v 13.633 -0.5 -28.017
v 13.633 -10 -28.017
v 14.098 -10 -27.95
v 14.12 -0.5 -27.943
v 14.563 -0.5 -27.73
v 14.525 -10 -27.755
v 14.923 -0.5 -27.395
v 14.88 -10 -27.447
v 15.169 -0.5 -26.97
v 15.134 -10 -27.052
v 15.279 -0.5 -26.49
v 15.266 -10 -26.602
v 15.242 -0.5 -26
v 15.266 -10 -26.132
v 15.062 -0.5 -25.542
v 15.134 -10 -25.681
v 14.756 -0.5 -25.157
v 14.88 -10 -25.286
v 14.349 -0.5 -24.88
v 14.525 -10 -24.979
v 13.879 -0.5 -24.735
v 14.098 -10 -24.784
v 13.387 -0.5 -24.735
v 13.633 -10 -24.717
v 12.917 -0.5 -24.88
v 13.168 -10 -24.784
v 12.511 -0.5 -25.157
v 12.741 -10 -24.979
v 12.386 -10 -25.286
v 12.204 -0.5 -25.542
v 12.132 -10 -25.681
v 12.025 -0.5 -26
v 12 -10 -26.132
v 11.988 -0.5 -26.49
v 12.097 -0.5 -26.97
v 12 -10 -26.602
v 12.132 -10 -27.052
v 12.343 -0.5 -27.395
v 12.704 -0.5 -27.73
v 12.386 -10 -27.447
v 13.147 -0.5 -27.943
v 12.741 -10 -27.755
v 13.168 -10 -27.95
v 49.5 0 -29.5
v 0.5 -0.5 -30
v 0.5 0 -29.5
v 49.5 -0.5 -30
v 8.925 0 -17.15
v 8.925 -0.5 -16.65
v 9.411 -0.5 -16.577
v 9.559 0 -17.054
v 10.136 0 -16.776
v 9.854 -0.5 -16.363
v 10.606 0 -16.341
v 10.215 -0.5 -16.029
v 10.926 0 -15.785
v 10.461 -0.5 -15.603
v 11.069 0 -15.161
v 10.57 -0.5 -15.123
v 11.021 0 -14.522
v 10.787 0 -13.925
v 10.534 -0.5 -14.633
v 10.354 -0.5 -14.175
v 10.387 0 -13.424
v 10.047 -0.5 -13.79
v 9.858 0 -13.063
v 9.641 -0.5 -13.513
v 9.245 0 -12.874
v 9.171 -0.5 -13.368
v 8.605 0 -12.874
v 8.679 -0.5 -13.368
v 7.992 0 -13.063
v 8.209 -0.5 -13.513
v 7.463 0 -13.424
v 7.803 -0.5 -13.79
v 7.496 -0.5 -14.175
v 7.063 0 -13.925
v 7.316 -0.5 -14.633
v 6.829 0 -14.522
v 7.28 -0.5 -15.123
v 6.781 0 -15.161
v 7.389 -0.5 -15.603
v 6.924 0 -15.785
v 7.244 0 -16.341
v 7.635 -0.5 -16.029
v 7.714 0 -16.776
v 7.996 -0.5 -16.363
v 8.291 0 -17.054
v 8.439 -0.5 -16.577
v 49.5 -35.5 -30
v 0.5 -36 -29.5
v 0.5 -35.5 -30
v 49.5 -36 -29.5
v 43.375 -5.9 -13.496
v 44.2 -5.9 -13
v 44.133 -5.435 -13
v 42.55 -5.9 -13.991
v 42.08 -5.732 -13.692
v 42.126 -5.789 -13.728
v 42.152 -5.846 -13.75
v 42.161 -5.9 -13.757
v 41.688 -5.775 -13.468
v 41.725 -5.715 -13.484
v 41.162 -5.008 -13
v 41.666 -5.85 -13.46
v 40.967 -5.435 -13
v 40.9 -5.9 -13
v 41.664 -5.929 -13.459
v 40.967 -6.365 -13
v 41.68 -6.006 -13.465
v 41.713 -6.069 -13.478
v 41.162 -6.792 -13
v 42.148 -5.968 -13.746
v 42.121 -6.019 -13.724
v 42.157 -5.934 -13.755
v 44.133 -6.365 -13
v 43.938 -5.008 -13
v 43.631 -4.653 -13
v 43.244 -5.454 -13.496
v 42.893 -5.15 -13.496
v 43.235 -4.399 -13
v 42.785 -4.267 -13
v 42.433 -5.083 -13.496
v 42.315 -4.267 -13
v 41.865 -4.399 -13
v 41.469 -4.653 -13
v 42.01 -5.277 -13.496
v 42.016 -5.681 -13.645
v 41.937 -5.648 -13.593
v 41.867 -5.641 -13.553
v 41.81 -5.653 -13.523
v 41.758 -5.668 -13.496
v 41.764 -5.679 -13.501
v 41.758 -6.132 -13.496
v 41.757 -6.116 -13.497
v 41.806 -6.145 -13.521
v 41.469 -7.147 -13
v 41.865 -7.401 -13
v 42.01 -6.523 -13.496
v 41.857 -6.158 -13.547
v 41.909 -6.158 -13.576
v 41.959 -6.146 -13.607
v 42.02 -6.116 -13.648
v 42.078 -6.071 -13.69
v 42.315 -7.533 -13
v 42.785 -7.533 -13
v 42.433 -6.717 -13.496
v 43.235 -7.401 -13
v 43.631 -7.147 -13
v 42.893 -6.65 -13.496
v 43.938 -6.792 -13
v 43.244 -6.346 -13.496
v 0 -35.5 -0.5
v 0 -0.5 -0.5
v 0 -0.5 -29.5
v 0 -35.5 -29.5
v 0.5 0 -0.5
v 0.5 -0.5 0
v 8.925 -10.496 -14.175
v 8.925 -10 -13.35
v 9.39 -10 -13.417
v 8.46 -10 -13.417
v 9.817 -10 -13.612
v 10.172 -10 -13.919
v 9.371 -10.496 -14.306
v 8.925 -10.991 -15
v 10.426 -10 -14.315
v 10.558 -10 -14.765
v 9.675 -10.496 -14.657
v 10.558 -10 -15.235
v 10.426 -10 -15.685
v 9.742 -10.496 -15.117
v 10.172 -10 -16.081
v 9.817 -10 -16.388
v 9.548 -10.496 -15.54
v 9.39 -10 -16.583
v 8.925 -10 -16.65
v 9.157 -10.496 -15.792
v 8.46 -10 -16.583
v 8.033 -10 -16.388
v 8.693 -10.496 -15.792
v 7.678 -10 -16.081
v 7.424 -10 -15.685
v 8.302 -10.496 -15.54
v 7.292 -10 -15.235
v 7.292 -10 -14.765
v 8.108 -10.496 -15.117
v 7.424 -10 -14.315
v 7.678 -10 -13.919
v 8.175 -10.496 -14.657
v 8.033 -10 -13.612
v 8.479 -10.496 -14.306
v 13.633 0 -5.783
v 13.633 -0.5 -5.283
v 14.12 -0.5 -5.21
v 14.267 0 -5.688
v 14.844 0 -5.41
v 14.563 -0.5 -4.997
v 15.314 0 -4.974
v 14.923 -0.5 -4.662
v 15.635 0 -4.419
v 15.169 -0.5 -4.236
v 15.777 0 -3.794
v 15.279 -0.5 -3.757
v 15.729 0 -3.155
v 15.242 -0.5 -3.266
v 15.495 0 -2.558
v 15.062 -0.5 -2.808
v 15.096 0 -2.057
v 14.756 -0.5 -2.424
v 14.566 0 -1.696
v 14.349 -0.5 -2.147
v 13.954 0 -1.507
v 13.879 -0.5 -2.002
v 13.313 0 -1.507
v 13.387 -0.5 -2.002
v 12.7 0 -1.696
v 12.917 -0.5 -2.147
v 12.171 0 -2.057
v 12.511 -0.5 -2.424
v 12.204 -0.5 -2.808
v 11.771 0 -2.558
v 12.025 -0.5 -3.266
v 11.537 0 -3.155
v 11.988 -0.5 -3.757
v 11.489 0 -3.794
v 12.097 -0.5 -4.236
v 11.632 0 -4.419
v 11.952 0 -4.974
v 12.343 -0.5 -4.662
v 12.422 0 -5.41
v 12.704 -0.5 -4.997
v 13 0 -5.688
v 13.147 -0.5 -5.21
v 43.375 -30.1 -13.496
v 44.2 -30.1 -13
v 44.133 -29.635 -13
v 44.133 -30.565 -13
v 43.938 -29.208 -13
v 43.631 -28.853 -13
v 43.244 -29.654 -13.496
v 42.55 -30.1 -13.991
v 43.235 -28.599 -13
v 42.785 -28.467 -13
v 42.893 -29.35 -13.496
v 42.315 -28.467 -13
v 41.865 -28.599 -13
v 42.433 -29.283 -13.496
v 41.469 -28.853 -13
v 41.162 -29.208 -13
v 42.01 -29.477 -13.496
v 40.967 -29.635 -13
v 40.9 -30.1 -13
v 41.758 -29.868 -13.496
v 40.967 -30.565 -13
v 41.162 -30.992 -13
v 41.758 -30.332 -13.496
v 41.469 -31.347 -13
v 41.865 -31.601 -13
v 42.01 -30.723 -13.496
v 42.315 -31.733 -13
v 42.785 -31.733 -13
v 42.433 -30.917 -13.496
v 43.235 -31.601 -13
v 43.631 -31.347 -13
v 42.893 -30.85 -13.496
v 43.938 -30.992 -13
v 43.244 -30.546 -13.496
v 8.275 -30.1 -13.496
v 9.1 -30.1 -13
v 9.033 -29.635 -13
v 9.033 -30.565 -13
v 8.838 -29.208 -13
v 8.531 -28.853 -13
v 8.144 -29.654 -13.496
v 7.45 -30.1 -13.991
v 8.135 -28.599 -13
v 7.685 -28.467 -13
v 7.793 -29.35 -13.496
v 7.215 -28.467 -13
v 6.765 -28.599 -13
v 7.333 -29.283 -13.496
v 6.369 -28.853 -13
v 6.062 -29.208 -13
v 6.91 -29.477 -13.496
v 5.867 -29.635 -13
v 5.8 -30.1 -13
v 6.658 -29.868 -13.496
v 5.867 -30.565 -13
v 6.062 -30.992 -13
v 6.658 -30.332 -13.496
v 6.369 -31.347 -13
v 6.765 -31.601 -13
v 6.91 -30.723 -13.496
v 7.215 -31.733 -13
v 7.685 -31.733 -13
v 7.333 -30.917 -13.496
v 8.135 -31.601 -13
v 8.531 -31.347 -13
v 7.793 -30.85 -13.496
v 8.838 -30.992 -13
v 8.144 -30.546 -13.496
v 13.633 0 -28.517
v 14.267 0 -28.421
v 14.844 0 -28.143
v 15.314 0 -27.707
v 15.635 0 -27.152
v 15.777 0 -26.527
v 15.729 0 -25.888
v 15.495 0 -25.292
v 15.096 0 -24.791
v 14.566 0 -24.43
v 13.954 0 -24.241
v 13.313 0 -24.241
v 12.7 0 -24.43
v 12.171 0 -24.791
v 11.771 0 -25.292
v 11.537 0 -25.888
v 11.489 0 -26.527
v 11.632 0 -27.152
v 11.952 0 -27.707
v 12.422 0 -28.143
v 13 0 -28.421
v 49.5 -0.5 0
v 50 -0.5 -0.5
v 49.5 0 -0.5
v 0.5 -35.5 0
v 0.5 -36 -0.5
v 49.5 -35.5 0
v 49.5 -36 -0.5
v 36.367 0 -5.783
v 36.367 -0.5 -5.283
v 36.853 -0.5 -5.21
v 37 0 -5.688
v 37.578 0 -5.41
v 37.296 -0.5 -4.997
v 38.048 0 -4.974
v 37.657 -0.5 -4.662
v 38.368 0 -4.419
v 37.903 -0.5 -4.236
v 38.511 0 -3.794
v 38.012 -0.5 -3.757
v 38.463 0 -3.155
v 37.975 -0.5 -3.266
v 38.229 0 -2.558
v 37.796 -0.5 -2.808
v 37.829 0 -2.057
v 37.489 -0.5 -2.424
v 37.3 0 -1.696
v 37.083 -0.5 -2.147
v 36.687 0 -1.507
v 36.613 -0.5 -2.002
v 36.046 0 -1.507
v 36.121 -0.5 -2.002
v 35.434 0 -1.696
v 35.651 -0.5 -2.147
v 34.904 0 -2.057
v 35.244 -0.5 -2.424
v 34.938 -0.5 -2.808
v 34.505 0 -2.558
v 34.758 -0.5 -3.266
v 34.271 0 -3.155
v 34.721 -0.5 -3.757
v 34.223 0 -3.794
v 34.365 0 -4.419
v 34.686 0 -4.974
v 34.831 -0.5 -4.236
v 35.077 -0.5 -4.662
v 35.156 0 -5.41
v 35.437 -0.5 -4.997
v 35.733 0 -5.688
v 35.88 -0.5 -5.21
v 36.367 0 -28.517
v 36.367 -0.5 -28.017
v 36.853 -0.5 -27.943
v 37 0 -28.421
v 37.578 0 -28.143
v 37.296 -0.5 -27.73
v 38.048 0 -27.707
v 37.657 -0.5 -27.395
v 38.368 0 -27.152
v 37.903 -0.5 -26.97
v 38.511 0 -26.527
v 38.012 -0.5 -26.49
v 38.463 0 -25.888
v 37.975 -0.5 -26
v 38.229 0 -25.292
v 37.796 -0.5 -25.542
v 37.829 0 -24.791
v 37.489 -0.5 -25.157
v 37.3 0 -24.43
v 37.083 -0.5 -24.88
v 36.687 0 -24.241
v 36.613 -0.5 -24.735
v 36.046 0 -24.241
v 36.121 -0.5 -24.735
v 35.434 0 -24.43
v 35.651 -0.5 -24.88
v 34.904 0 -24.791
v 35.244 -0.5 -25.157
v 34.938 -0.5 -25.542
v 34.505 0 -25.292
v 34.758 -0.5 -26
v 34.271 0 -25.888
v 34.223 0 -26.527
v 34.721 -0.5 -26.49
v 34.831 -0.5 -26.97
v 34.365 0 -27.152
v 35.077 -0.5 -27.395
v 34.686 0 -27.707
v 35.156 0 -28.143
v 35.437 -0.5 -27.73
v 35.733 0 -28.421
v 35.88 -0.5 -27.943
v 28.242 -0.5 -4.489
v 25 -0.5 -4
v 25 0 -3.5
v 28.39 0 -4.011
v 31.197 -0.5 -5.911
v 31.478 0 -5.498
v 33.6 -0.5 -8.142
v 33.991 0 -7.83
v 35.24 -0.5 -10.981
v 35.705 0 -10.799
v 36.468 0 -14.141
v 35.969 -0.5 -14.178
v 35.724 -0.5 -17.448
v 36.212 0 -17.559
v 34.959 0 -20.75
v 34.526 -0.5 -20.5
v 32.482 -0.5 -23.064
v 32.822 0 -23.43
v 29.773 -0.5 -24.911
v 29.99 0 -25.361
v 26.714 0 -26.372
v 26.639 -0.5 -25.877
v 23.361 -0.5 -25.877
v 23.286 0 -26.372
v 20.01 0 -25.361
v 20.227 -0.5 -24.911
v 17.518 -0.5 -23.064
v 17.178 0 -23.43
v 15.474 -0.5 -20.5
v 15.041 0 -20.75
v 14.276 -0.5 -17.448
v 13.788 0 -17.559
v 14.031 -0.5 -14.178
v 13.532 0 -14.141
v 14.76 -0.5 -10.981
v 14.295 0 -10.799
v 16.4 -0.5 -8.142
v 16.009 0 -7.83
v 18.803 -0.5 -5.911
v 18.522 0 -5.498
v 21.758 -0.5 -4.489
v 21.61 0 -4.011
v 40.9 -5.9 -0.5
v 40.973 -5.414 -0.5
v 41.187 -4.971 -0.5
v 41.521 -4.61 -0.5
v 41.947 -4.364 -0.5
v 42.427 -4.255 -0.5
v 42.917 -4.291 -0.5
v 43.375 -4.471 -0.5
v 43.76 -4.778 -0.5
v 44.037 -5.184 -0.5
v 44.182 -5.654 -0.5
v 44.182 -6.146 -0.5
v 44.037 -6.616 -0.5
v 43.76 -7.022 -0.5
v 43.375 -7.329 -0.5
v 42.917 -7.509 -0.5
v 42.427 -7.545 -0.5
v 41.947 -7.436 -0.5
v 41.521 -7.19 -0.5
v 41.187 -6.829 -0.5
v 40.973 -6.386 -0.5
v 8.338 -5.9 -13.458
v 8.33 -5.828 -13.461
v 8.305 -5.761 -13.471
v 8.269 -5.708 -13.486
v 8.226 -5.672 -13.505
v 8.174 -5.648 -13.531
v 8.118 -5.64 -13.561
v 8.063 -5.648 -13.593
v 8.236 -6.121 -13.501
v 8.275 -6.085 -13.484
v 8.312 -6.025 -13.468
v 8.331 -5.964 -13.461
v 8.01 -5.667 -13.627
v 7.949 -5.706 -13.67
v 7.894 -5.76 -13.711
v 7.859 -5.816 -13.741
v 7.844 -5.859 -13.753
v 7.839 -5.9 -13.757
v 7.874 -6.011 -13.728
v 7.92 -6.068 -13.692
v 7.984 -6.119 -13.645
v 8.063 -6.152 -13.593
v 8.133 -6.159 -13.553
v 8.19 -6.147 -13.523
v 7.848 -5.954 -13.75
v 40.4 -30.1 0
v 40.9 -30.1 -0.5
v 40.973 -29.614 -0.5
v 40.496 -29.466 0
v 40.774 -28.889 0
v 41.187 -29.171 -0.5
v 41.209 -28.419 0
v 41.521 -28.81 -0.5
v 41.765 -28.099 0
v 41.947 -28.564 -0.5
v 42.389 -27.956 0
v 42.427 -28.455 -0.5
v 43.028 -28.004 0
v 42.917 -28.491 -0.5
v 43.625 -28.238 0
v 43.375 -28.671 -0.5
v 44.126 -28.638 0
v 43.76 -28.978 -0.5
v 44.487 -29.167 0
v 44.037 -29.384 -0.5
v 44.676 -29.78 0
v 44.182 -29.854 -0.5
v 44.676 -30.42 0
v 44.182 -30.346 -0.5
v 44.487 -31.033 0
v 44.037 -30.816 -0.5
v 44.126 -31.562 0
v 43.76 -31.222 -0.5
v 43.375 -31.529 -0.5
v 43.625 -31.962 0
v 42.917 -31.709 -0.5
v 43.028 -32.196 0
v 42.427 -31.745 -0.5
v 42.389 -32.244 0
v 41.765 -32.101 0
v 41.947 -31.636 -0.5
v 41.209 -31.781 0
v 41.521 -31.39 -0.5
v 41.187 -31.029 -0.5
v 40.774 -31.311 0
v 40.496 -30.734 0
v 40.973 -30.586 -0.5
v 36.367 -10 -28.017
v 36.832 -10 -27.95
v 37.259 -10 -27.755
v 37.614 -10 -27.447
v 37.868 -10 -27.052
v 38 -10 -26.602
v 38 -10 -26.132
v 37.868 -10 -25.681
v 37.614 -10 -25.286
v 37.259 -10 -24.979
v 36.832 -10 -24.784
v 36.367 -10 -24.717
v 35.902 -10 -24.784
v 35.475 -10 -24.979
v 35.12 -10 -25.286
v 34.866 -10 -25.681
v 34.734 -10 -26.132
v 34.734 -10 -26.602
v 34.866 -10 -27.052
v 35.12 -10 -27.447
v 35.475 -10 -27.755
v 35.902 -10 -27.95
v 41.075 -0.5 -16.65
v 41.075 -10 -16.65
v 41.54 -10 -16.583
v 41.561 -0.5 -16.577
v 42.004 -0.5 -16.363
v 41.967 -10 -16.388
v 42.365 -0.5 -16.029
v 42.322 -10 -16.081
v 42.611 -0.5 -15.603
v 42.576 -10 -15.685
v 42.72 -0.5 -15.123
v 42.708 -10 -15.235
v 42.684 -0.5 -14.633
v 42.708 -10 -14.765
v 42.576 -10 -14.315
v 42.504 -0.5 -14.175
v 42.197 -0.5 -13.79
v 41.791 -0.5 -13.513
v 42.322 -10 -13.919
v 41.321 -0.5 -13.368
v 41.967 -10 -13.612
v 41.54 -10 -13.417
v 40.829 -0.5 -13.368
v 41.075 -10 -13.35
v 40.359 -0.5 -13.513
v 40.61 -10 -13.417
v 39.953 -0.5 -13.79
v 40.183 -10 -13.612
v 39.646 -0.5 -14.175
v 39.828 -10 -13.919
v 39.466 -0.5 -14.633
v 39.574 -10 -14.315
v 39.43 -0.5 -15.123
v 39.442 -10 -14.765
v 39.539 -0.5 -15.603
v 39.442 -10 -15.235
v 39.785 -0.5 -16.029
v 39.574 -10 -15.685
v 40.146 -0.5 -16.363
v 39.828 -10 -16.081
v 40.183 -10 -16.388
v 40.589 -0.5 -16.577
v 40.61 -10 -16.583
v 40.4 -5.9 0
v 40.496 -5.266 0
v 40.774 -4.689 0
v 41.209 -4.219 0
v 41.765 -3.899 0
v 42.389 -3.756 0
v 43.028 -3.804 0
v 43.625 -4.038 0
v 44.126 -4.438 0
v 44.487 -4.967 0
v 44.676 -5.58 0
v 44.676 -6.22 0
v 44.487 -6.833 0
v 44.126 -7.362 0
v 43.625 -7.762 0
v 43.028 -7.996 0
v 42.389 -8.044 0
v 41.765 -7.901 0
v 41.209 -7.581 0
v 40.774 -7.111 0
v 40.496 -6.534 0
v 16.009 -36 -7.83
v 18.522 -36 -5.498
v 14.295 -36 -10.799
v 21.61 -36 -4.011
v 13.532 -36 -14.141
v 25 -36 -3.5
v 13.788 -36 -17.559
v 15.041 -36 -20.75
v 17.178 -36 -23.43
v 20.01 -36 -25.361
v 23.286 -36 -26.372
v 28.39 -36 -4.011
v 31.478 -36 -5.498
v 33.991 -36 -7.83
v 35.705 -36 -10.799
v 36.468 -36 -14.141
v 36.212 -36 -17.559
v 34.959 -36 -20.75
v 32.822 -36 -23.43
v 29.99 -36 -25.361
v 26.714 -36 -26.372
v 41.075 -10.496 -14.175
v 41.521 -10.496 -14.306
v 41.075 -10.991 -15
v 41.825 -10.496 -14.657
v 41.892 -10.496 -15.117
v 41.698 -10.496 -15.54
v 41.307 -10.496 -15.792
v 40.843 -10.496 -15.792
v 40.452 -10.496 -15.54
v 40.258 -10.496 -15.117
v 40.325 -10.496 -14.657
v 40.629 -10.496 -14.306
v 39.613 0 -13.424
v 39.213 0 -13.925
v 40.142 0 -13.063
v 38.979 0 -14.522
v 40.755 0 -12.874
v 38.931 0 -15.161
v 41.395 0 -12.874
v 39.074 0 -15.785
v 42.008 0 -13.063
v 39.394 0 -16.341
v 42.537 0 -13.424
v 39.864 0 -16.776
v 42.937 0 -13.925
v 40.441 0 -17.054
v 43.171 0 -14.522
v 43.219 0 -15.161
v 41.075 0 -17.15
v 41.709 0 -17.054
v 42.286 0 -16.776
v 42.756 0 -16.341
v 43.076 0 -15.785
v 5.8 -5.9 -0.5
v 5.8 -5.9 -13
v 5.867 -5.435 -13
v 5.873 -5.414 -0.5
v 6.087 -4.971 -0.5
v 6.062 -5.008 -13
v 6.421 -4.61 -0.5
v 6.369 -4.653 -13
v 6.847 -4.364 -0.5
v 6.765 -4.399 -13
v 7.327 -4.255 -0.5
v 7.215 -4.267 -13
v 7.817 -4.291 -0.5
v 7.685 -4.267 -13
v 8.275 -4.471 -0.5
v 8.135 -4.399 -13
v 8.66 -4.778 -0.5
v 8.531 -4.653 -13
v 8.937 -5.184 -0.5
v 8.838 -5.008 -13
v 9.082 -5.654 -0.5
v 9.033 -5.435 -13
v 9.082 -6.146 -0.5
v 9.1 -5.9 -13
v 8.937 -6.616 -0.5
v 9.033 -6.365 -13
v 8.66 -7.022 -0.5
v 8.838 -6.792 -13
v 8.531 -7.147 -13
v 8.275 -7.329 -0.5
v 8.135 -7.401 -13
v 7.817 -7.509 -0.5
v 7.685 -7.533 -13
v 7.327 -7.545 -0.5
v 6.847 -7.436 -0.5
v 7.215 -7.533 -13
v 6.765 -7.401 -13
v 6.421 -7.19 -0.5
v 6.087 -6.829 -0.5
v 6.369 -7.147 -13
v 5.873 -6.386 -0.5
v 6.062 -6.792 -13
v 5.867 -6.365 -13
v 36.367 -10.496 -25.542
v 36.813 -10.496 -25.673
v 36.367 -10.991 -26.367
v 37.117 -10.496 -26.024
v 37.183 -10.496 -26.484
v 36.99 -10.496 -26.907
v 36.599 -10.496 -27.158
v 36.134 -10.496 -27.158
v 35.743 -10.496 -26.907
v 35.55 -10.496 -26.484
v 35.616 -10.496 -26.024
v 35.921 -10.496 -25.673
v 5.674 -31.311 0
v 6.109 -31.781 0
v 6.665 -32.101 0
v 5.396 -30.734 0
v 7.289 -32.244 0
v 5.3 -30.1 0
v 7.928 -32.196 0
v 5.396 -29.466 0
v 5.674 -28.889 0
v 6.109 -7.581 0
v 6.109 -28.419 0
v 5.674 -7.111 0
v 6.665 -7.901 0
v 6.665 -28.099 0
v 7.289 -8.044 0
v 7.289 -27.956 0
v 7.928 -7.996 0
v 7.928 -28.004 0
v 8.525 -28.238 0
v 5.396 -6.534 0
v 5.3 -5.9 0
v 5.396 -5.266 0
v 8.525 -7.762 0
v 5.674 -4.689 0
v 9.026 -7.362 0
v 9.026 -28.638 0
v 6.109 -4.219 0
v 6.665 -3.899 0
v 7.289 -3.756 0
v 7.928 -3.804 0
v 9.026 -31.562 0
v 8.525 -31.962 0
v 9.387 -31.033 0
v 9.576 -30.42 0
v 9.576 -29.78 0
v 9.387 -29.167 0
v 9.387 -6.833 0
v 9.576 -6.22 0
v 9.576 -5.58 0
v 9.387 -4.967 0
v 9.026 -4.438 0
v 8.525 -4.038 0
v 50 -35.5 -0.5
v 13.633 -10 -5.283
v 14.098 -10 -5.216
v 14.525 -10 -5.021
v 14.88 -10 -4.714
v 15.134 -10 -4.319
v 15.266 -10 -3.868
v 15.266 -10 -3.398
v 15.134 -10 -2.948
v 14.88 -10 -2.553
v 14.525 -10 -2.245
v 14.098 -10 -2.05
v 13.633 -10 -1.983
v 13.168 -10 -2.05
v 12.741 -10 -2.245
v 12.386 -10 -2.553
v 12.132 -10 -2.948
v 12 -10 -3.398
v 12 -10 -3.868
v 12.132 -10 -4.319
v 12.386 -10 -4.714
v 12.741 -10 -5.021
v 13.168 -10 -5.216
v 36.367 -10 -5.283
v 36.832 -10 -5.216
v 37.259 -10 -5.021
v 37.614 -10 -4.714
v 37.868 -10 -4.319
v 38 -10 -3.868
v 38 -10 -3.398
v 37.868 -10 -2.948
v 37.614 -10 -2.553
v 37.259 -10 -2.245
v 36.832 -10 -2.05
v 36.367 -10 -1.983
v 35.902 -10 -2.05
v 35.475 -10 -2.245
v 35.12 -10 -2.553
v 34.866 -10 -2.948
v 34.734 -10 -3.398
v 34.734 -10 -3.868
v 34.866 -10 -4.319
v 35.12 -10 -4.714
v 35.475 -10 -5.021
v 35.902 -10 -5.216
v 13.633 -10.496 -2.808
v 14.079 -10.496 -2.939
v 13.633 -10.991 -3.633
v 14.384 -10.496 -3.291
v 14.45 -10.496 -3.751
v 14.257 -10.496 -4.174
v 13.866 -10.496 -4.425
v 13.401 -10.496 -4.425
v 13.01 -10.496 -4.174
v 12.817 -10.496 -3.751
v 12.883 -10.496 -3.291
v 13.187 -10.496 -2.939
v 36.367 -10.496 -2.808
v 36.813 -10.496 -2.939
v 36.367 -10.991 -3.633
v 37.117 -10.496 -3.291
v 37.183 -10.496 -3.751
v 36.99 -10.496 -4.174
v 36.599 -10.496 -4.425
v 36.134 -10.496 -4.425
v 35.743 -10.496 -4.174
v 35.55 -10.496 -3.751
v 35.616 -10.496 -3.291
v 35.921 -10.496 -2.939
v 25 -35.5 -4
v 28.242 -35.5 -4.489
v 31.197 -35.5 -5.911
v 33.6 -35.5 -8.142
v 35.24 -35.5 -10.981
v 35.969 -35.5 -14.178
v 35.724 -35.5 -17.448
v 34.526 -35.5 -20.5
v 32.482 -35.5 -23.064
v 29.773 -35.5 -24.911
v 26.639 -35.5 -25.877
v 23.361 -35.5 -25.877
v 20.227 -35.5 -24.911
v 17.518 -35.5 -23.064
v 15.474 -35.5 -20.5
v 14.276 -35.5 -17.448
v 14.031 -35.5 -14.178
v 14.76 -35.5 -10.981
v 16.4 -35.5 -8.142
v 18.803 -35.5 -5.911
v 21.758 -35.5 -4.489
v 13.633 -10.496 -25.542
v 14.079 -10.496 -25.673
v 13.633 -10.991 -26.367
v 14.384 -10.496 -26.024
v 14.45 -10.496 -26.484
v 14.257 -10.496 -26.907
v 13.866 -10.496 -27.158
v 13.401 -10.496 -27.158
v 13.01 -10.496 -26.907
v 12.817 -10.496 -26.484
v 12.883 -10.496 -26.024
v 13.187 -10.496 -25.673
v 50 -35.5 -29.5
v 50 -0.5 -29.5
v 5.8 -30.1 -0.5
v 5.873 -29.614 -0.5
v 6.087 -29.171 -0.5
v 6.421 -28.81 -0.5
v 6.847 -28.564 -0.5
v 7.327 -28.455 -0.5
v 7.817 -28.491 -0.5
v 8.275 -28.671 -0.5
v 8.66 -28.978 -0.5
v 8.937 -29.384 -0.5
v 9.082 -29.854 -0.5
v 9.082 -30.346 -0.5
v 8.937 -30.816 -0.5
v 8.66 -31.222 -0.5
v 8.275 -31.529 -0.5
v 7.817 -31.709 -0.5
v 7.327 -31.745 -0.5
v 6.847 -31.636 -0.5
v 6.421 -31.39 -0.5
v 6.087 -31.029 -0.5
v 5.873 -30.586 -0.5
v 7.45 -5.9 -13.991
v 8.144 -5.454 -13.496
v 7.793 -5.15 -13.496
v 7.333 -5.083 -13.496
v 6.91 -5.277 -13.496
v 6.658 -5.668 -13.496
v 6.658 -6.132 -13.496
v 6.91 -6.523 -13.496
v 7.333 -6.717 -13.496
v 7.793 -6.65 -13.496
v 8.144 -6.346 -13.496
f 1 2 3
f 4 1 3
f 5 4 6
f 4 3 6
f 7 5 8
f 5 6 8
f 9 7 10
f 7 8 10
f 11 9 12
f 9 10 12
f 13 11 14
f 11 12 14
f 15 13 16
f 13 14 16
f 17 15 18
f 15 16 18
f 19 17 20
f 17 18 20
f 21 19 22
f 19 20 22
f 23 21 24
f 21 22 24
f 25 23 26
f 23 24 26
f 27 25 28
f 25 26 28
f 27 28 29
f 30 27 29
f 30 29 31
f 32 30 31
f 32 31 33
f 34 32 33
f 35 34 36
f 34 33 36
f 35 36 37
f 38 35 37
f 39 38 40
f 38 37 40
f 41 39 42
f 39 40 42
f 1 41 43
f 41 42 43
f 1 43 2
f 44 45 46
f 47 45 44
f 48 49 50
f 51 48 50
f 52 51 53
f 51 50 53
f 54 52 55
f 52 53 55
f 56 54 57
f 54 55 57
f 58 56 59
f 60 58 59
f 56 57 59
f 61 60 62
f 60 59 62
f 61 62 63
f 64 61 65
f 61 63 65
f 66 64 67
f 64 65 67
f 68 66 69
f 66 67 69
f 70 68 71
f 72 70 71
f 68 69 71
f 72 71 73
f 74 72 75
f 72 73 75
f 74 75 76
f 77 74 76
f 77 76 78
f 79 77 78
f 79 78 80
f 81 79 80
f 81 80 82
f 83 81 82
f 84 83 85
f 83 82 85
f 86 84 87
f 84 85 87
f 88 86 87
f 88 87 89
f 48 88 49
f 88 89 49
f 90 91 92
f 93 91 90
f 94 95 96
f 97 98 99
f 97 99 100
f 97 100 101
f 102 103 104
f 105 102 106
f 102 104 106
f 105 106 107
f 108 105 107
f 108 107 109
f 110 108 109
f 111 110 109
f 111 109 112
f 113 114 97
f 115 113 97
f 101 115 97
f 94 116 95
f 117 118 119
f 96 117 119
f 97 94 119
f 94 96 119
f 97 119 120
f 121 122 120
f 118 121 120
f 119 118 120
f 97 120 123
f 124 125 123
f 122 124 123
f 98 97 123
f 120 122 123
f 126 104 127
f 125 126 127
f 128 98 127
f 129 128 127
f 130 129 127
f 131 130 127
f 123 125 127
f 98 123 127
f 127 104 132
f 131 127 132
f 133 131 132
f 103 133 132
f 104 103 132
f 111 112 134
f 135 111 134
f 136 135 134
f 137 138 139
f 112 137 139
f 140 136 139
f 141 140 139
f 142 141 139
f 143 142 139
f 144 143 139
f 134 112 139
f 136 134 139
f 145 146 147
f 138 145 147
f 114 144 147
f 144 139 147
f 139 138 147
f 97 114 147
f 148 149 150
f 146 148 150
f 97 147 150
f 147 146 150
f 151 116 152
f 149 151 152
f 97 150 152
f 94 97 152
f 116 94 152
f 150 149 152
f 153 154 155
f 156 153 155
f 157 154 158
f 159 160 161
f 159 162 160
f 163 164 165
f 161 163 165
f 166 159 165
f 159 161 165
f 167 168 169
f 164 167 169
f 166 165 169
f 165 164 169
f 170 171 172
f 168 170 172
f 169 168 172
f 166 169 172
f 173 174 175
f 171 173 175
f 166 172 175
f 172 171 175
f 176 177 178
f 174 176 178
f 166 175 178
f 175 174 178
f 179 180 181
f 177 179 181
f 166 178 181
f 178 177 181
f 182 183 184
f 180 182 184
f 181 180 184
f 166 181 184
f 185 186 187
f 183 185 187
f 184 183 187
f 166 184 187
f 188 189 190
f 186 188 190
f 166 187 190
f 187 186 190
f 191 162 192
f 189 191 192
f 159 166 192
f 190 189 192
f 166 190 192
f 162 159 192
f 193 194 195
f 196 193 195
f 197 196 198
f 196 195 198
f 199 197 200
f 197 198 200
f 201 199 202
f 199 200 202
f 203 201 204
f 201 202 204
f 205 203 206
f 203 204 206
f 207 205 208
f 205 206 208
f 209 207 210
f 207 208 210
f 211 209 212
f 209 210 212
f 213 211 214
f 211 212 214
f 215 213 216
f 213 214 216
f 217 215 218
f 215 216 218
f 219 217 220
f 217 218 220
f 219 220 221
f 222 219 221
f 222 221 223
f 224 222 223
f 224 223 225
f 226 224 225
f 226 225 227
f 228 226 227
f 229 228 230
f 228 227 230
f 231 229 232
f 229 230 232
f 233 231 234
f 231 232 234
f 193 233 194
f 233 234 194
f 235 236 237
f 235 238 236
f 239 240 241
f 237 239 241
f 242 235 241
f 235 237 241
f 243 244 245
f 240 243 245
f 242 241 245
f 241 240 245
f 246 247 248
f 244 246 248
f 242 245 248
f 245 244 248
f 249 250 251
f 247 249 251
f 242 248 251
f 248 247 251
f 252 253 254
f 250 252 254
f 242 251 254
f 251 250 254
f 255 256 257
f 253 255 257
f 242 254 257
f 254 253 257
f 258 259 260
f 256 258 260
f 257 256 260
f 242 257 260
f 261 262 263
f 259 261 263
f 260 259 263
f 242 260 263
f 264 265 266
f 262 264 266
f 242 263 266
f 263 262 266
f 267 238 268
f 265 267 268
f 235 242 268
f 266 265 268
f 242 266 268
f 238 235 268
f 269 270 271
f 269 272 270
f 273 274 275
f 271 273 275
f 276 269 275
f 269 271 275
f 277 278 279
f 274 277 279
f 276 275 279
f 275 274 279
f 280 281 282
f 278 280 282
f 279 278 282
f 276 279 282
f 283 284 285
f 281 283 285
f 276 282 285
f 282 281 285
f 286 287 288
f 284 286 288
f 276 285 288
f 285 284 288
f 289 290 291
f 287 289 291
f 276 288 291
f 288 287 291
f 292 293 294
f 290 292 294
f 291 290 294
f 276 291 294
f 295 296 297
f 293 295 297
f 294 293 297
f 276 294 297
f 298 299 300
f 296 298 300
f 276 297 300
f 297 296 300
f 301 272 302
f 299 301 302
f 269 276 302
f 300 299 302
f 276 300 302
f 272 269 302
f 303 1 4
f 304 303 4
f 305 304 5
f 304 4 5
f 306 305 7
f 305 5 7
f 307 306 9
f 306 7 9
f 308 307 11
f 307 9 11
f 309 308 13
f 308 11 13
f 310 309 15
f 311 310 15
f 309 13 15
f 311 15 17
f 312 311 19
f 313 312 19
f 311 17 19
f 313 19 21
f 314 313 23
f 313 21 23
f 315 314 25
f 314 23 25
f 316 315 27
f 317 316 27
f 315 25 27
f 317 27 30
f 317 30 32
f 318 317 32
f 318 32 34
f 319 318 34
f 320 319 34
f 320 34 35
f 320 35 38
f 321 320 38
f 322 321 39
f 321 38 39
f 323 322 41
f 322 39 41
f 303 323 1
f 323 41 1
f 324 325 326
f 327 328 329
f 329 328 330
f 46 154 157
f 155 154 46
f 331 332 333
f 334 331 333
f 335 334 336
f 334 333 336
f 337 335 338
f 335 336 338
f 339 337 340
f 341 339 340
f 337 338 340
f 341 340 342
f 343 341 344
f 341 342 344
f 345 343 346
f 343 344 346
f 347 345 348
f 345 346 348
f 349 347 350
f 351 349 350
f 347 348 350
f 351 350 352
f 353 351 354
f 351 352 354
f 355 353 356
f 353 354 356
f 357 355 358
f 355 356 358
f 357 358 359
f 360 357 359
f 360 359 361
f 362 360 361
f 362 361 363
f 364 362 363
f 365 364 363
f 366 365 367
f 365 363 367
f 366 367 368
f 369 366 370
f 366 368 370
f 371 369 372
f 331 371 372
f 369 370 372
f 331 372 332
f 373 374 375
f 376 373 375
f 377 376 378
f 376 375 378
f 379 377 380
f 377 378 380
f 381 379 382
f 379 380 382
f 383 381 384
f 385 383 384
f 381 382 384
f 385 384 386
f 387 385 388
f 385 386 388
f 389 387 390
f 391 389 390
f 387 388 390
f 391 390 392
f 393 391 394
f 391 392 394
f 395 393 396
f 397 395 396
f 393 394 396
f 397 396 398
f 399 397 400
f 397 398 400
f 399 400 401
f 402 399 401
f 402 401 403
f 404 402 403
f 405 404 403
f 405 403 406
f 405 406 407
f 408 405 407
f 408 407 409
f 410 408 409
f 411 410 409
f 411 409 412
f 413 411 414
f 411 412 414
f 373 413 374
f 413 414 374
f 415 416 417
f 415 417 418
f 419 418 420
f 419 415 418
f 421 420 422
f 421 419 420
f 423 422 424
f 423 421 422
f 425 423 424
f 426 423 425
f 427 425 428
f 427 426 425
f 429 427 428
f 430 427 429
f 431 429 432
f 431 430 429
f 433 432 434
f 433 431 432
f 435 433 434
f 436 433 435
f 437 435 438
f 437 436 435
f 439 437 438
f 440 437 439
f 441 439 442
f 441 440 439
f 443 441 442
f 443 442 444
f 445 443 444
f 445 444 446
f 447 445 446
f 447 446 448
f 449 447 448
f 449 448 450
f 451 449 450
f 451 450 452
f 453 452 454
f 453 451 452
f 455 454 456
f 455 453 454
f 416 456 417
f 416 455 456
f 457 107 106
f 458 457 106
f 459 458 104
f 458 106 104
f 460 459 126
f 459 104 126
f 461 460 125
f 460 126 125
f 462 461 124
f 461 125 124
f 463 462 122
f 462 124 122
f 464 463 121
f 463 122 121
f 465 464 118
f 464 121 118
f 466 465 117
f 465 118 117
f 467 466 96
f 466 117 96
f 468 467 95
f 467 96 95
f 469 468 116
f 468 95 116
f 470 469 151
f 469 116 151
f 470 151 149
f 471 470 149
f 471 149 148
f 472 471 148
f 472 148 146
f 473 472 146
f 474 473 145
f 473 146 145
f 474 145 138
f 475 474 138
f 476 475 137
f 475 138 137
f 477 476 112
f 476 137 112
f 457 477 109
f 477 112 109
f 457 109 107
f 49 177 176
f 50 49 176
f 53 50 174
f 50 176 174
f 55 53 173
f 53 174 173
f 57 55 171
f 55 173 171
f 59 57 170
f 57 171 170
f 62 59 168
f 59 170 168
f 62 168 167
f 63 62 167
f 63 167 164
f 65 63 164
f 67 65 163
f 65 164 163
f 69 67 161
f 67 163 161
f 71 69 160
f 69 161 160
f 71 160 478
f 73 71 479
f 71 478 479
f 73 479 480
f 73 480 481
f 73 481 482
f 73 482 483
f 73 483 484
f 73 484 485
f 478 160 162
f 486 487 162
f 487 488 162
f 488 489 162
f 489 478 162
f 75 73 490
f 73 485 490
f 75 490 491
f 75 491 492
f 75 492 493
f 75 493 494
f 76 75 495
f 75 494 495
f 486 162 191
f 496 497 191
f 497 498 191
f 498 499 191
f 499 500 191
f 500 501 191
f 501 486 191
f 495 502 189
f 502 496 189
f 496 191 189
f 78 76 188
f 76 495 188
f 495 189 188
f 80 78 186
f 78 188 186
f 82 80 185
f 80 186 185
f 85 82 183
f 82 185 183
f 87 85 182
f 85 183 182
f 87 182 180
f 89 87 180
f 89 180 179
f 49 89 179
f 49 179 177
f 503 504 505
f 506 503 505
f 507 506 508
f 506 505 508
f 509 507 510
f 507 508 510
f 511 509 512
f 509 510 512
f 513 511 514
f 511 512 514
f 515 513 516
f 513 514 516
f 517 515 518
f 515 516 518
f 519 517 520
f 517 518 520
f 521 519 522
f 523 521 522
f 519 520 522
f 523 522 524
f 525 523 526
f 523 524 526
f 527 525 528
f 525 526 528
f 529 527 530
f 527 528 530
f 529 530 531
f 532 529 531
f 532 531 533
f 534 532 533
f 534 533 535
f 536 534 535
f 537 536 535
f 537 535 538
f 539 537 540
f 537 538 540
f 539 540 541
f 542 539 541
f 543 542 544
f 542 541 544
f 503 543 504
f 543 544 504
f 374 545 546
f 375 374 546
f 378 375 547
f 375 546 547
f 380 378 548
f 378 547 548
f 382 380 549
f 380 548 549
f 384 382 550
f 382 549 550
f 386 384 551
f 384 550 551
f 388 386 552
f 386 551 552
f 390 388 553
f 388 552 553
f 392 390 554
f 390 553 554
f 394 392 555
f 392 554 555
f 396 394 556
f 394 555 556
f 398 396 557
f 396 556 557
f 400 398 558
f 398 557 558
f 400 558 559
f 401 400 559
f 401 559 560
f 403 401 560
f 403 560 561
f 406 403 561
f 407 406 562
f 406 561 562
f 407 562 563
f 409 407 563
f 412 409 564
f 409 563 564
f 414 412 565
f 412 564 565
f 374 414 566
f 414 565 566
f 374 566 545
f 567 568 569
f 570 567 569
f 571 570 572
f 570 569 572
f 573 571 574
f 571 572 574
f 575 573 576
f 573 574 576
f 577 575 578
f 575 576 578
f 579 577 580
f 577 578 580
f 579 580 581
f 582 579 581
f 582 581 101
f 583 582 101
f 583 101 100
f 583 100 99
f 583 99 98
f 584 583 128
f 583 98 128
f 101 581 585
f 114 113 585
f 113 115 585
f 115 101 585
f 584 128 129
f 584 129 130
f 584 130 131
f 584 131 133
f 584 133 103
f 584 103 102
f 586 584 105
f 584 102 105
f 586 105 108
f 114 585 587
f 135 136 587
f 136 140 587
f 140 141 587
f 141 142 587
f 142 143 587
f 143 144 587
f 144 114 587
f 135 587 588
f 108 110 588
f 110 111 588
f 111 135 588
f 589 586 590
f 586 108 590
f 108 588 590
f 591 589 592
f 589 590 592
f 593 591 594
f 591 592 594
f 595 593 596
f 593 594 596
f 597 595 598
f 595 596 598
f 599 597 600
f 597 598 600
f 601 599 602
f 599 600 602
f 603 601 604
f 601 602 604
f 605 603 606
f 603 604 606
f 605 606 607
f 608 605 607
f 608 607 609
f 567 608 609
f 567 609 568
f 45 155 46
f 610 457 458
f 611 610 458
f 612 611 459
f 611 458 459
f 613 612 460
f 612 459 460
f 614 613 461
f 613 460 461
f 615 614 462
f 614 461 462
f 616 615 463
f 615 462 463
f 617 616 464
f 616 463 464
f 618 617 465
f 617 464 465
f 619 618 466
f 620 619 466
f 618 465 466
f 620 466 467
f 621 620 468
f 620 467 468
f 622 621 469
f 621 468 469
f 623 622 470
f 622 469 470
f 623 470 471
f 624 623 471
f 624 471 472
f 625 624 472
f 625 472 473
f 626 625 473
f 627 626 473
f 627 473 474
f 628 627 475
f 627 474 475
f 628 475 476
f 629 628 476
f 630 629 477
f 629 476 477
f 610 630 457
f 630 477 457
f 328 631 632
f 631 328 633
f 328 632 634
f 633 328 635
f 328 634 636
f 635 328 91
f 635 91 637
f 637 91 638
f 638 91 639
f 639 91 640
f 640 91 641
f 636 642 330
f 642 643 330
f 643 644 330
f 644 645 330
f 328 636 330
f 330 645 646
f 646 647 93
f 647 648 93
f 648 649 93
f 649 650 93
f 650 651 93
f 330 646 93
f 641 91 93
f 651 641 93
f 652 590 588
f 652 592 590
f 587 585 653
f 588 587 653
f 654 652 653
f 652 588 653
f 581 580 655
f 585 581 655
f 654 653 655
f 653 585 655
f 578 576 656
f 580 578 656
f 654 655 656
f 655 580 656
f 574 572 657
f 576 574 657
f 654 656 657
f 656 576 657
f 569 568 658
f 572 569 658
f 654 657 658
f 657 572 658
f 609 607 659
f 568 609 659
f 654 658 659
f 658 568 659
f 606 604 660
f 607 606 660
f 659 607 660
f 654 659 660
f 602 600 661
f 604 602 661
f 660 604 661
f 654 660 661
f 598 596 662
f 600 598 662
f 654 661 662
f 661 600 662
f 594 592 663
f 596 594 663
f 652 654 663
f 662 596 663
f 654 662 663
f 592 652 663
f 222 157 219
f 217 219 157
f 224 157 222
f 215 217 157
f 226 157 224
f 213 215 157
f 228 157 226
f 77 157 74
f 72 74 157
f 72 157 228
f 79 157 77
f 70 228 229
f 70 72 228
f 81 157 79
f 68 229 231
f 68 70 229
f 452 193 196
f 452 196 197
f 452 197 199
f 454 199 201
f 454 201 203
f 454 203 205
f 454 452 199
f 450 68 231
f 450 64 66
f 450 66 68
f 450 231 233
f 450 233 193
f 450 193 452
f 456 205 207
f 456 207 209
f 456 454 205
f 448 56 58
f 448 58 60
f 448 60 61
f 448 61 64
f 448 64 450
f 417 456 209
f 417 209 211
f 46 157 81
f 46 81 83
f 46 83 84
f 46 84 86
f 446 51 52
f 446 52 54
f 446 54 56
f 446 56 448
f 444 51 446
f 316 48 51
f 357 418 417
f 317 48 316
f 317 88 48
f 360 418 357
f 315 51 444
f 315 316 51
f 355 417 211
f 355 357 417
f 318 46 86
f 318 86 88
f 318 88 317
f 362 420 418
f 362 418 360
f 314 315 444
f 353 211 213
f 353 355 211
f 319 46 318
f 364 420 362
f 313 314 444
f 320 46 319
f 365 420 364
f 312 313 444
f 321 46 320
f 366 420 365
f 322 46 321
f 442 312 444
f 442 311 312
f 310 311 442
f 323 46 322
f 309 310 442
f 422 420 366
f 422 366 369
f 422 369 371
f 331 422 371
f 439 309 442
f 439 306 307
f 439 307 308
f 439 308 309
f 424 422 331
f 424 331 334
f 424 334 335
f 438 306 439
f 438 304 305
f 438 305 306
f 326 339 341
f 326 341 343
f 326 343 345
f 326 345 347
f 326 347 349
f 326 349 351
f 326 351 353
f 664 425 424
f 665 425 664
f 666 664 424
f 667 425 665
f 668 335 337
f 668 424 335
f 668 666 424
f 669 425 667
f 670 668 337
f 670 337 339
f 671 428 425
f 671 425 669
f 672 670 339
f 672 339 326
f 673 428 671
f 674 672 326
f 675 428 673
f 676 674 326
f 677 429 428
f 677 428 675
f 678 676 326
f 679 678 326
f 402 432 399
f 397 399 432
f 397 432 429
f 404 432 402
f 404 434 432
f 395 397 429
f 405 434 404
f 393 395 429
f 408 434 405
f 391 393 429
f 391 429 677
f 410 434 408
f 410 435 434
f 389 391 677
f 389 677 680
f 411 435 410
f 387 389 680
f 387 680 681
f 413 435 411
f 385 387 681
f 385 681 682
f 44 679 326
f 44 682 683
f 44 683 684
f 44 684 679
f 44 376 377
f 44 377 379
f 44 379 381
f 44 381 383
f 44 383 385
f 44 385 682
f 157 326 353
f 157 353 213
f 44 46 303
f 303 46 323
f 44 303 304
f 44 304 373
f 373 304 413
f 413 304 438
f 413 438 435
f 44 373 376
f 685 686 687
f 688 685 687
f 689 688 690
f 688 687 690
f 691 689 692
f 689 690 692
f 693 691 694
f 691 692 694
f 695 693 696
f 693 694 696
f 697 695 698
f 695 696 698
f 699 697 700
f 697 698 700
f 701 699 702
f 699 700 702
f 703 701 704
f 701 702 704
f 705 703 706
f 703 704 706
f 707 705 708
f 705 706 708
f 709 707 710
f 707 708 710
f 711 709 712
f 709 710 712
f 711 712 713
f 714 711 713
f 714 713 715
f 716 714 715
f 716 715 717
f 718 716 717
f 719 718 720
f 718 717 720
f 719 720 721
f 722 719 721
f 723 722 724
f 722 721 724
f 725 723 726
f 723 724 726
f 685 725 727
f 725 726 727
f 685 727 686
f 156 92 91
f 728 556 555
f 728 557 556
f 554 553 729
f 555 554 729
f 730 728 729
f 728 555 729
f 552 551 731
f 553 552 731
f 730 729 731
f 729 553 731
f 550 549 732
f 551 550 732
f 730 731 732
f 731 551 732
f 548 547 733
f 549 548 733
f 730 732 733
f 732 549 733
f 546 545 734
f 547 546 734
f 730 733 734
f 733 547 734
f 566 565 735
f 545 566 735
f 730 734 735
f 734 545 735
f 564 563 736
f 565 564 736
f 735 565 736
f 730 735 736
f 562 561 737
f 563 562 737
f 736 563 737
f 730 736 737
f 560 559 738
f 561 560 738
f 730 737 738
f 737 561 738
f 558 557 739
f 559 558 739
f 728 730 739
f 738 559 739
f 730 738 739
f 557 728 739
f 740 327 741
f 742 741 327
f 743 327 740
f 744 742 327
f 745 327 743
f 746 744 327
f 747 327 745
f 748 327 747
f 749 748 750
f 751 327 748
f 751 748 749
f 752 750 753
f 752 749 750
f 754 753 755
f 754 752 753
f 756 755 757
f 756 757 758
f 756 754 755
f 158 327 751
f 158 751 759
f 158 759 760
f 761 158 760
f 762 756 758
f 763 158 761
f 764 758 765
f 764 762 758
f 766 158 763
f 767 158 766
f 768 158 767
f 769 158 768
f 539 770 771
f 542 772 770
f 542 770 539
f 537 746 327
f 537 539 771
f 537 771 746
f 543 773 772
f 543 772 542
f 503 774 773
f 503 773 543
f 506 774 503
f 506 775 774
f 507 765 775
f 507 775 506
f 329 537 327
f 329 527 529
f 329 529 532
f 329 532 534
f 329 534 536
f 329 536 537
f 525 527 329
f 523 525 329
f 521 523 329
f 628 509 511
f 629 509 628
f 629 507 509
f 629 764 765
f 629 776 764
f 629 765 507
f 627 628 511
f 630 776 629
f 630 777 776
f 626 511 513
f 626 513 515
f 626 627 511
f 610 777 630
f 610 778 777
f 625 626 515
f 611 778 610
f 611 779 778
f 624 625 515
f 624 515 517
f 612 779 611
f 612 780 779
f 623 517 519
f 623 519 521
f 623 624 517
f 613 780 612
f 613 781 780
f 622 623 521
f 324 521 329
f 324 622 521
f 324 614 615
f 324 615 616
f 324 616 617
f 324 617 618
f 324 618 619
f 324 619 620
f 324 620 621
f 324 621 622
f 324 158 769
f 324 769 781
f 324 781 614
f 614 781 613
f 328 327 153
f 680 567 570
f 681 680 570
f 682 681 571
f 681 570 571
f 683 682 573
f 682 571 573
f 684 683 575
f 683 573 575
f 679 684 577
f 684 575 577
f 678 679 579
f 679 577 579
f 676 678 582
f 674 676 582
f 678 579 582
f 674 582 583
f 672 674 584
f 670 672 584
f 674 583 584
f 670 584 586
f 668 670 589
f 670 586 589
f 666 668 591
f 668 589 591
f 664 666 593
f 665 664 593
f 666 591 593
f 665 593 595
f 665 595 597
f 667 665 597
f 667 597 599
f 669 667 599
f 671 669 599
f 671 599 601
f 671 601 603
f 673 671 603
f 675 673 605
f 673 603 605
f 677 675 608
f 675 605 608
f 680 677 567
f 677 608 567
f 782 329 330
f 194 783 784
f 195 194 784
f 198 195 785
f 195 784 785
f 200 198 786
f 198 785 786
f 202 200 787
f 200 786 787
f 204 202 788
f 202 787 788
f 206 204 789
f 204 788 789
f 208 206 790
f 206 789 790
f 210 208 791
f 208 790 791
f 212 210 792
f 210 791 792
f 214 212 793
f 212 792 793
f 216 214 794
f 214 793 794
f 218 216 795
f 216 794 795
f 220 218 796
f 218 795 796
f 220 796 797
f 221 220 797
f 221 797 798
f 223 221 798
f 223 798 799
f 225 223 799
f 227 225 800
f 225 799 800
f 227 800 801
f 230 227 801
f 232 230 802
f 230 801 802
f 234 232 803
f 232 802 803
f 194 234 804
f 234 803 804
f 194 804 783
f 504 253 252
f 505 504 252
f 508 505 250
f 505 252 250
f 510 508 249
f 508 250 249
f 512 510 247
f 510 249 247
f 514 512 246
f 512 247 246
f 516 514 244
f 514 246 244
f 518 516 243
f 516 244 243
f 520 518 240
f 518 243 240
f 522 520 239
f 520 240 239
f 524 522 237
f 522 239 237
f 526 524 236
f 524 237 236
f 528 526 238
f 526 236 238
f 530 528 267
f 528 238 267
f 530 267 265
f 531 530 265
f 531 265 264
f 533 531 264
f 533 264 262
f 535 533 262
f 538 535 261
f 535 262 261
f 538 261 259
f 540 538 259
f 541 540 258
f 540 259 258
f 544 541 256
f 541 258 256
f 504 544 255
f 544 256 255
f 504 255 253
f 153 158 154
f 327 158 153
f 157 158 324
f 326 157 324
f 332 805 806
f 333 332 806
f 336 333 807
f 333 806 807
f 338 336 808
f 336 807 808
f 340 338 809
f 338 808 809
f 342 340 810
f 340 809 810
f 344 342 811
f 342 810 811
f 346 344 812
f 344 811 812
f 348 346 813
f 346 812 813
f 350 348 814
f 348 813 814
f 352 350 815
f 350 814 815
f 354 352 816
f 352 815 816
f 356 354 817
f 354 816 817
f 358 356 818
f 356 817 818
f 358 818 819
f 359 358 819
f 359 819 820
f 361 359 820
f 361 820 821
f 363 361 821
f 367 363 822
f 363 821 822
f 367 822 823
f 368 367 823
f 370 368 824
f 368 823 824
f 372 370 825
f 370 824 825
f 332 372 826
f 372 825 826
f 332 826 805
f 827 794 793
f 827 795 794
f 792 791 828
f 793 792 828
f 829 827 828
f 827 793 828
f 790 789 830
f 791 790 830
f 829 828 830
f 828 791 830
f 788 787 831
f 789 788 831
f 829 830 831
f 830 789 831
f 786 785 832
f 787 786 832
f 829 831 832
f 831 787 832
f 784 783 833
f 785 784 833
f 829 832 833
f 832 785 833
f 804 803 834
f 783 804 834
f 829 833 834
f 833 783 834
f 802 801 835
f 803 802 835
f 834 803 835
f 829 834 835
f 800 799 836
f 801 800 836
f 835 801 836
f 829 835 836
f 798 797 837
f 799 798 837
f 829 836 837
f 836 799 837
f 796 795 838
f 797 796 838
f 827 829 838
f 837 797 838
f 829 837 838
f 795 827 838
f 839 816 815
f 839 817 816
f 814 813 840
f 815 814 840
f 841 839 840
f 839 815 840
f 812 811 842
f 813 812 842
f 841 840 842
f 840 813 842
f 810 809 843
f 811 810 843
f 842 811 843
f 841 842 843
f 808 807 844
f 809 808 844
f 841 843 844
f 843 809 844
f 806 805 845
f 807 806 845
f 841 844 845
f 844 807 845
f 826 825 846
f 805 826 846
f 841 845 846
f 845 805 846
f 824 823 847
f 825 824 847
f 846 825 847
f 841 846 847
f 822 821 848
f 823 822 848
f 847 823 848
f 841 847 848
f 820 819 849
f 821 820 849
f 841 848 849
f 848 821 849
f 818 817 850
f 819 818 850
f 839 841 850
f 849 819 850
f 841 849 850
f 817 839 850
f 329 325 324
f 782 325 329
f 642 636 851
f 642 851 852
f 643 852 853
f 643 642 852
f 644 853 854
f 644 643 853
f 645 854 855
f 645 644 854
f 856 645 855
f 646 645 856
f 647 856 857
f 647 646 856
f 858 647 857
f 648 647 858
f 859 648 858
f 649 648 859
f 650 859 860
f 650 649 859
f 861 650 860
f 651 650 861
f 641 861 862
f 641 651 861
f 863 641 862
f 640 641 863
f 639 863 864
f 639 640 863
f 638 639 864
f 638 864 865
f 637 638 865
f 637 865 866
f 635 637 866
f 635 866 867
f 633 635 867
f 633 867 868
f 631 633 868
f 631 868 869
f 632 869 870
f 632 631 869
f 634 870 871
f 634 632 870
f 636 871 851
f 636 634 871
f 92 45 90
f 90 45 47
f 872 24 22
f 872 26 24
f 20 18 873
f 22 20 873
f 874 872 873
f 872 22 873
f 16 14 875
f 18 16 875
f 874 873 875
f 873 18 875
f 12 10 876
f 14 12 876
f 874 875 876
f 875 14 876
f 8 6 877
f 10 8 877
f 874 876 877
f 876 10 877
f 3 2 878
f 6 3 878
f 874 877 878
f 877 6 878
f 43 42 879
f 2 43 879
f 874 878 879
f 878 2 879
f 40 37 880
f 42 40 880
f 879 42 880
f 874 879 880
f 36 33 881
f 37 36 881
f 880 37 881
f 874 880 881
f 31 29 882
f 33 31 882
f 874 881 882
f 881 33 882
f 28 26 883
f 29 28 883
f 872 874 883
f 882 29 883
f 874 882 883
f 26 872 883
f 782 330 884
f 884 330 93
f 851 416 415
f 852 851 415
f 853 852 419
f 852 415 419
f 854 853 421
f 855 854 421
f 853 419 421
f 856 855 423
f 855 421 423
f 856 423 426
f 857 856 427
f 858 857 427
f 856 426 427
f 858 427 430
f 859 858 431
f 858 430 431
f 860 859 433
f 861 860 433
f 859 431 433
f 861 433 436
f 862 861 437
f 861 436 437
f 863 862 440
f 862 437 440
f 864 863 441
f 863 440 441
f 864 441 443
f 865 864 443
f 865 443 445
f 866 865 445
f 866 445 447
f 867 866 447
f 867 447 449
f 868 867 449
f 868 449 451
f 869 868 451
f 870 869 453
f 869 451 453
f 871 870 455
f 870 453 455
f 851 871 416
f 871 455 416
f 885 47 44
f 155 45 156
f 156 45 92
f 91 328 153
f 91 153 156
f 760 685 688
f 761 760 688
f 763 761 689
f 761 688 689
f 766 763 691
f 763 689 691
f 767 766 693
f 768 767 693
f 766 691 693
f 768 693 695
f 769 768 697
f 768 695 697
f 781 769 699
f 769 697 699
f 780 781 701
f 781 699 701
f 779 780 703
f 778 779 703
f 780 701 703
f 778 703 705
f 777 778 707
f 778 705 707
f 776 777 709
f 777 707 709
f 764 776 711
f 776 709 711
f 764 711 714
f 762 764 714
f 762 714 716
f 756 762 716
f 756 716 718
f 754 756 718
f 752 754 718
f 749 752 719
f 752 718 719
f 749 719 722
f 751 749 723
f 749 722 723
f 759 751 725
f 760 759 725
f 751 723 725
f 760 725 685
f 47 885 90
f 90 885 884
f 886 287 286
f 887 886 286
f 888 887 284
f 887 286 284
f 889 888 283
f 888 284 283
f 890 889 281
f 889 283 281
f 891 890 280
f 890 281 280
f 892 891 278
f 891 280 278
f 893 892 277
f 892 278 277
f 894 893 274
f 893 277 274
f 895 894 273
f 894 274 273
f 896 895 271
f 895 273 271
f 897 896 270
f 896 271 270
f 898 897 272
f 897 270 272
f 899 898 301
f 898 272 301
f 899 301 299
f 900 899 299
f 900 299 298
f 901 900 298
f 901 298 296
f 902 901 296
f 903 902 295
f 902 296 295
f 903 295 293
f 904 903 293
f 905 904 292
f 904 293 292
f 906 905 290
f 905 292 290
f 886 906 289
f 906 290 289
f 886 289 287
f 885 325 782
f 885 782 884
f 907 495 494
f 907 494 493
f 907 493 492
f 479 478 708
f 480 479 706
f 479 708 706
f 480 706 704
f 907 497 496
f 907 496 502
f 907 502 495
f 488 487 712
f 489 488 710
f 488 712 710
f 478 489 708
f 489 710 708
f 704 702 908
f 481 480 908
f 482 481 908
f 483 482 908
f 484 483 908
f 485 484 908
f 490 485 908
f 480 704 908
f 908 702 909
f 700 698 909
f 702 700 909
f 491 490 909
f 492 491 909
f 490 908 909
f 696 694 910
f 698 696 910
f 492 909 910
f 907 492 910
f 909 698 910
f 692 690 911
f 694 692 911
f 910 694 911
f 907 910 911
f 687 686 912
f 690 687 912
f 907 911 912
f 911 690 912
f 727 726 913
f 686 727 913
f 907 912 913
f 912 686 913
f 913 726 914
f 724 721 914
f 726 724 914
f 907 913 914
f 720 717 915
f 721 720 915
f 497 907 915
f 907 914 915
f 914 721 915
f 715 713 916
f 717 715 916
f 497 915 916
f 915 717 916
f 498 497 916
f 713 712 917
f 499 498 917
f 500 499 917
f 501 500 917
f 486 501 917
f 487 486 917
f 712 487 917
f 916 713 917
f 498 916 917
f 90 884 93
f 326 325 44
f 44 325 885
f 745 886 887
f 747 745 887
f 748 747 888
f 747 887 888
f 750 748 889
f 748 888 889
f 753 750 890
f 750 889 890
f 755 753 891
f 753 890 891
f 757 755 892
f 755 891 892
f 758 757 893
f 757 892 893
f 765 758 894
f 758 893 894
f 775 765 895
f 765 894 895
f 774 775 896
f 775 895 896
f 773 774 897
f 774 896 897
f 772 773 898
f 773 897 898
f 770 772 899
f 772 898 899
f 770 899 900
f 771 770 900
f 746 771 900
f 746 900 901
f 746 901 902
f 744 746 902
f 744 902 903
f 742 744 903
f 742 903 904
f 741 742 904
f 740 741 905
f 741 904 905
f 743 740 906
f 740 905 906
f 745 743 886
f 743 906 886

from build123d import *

# Parameters (mm, degrees)
SKETCH1_W                       = 50
SKETCH1_H                       = 30
SKETCH1_R                       = 1.65
SKETCH1_R_2                     = 11
BOSS_EXTRUDE1_DEPTH             = 36
TAP_DRILL_FOR_M4X0_7_TAP1_D     = 3.3
TAP_DRILL_FOR_M4X0_7_TAP1_DEPTH = 10
TAP_DRILL_FOR_M4X0_7_TAP1_TIP   = 0.991420021
TAP_DRILL_FOR_M4X0_7_TAP2_D     = 3.3
TAP_DRILL_FOR_M4X0_7_TAP2_DEPTH = 13
TAP_DRILL_FOR_M4X0_7_TAP2_TIP   = 0.991420021
CHAMFER1_SIZE                   = 0.5


with BuildPart() as part:
    # Sketch1 → Boss-Extrude1 (new body)
    # profile 1 of 7: a face of its own
    with BuildSketch(Plane(origin=(0, 0, 0), x_dir=(1, 0, 0), z_dir=(0, 1, 0))):
        with Locations((25, 15)):
            Rectangle(SKETCH1_W, SKETCH1_H)
        with Locations((36.366741508, 3.633258492)):
            Circle(SKETCH1_R, mode=Mode.SUBTRACT)
        with Locations((13.633258492, 3.633258492)):
            Circle(SKETCH1_R, mode=Mode.SUBTRACT)
        with Locations((8.925, 15)):
            Circle(SKETCH1_R, mode=Mode.SUBTRACT)
        with Locations((13.633258492, 26.366741508)):
            Circle(SKETCH1_R, mode=Mode.SUBTRACT)
        with Locations((36.366741508, 26.366741508)):
            Circle(SKETCH1_R, mode=Mode.SUBTRACT)
        with Locations((41.075, 15)):
            Circle(SKETCH1_R, mode=Mode.SUBTRACT)
        with Locations(Location((25, 15, 0), (0, 0, 270))):
            Circle(SKETCH1_R_2, mode=Mode.SUBTRACT)
    # profile 2 of 7: a face of its own
    with BuildSketch(Plane(origin=(0, 0, 0), x_dir=(1, 0, 0), z_dir=(0, 1, 0))):
        with Locations((41.075, 15)):
            Circle(SKETCH1_R)
    # profile 3 of 7: a face of its own
    with BuildSketch(Plane(origin=(0, 0, 0), x_dir=(1, 0, 0), z_dir=(0, 1, 0))):
        with Locations((36.366741508, 26.366741508)):
            Circle(SKETCH1_R)
    # profile 4 of 7: a face of its own
    with BuildSketch(Plane(origin=(0, 0, 0), x_dir=(1, 0, 0), z_dir=(0, 1, 0))):
        with Locations((36.366741508, 3.633258492)):
            Circle(SKETCH1_R)
    # profile 5 of 7: a face of its own
    with BuildSketch(Plane(origin=(0, 0, 0), x_dir=(1, 0, 0), z_dir=(0, 1, 0))):
        with Locations((13.633258492, 3.633258492)):
            Circle(SKETCH1_R)
    # profile 6 of 7: a face of its own
    with BuildSketch(Plane(origin=(0, 0, 0), x_dir=(1, 0, 0), z_dir=(0, 1, 0))):
        with Locations((8.925, 15)):
            Circle(SKETCH1_R)
    # profile 7 of 7: a face of its own
    with BuildSketch(Plane(origin=(0, 0, 0), x_dir=(1, 0, 0), z_dir=(0, 1, 0))):
        with Locations((13.633258492, 26.366741508)):
            Circle(SKETCH1_R)
    extrude(amount=-BOSS_EXTRUDE1_DEPTH)

    # Tap Drill for M4x0.7 Tap1
    with Locations(Plane(origin=(8.925, 0, -15), x_dir=(0, 0, 1), z_dir=(0, 1, 0))):
        with Locations((0, 0), (-11.366741508, 4.708258492), (-11.366741508, 27.441741508), (0, 32.15), (11.366741508, 27.441741508), (11.366741508, 4.708258492)):
            Hole(TAP_DRILL_FOR_M4X0_7_TAP1_D / 2, depth=TAP_DRILL_FOR_M4X0_7_TAP1_DEPTH)
            with Locations((0, 0, -(TAP_DRILL_FOR_M4X0_7_TAP1_DEPTH + TAP_DRILL_FOR_M4X0_7_TAP1_TIP / 2))):  # 118° drill point
                Cone(0, TAP_DRILL_FOR_M4X0_7_TAP1_D / 2, TAP_DRILL_FOR_M4X0_7_TAP1_TIP, mode=Mode.SUBTRACT)

    # Tap Drill for M4x0.7 Tap2
    with Locations(Plane(origin=(7.45, -5.9, 0), x_dir=(1, 0, 0), z_dir=(0, 0, 1))):
        with Locations((0, 0), (35.1, 0), (35.1, -24.2), (0, -24.2)):
            Hole(TAP_DRILL_FOR_M4X0_7_TAP2_D / 2, depth=TAP_DRILL_FOR_M4X0_7_TAP2_DEPTH)
            with Locations((0, 0, -(TAP_DRILL_FOR_M4X0_7_TAP2_DEPTH + TAP_DRILL_FOR_M4X0_7_TAP2_TIP / 2))):  # 118° drill point
                Cone(0, TAP_DRILL_FOR_M4X0_7_TAP2_D / 2, TAP_DRILL_FOR_M4X0_7_TAP2_TIP, mode=Mode.SUBTRACT)

    # Chamfer1
    chamfer1_edges = [part.edges().sort_by_distance(p)[0] for p in [
        (0, -18, 0),
        (0, -18, -30),
        (50, -18, -30),
        (25, -36, 0),
        (50, -18, 0),
        (50, -36, -15),
        (13.633258492, 0, -1.983258492),
        (25, -36, -30),
        (36.366741508, 0, -1.983258492),
        (0, -36, -15),
        (41.075, 0, -13.35),
        (36.366741508, 0, -24.716741508),
        (13.633258492, 0, -24.716741508),
        (8.925, 0, -13.35),
        (9.1, -30.1, 0),
        (44.2, -30.1, 0),
        (44.2, -5.9, 0),
        (25, -36, -26),
        (9.1, -5.9, 0),
        (0, 0, -15),
        (25, 0, -30),
        (50, 0, -15),
        (25, 0, 0),
        (25, 0, -26),
    ]]
    chamfer(chamfer1_edges, length=CHAMFER1_SIZE)


solid = part.part
